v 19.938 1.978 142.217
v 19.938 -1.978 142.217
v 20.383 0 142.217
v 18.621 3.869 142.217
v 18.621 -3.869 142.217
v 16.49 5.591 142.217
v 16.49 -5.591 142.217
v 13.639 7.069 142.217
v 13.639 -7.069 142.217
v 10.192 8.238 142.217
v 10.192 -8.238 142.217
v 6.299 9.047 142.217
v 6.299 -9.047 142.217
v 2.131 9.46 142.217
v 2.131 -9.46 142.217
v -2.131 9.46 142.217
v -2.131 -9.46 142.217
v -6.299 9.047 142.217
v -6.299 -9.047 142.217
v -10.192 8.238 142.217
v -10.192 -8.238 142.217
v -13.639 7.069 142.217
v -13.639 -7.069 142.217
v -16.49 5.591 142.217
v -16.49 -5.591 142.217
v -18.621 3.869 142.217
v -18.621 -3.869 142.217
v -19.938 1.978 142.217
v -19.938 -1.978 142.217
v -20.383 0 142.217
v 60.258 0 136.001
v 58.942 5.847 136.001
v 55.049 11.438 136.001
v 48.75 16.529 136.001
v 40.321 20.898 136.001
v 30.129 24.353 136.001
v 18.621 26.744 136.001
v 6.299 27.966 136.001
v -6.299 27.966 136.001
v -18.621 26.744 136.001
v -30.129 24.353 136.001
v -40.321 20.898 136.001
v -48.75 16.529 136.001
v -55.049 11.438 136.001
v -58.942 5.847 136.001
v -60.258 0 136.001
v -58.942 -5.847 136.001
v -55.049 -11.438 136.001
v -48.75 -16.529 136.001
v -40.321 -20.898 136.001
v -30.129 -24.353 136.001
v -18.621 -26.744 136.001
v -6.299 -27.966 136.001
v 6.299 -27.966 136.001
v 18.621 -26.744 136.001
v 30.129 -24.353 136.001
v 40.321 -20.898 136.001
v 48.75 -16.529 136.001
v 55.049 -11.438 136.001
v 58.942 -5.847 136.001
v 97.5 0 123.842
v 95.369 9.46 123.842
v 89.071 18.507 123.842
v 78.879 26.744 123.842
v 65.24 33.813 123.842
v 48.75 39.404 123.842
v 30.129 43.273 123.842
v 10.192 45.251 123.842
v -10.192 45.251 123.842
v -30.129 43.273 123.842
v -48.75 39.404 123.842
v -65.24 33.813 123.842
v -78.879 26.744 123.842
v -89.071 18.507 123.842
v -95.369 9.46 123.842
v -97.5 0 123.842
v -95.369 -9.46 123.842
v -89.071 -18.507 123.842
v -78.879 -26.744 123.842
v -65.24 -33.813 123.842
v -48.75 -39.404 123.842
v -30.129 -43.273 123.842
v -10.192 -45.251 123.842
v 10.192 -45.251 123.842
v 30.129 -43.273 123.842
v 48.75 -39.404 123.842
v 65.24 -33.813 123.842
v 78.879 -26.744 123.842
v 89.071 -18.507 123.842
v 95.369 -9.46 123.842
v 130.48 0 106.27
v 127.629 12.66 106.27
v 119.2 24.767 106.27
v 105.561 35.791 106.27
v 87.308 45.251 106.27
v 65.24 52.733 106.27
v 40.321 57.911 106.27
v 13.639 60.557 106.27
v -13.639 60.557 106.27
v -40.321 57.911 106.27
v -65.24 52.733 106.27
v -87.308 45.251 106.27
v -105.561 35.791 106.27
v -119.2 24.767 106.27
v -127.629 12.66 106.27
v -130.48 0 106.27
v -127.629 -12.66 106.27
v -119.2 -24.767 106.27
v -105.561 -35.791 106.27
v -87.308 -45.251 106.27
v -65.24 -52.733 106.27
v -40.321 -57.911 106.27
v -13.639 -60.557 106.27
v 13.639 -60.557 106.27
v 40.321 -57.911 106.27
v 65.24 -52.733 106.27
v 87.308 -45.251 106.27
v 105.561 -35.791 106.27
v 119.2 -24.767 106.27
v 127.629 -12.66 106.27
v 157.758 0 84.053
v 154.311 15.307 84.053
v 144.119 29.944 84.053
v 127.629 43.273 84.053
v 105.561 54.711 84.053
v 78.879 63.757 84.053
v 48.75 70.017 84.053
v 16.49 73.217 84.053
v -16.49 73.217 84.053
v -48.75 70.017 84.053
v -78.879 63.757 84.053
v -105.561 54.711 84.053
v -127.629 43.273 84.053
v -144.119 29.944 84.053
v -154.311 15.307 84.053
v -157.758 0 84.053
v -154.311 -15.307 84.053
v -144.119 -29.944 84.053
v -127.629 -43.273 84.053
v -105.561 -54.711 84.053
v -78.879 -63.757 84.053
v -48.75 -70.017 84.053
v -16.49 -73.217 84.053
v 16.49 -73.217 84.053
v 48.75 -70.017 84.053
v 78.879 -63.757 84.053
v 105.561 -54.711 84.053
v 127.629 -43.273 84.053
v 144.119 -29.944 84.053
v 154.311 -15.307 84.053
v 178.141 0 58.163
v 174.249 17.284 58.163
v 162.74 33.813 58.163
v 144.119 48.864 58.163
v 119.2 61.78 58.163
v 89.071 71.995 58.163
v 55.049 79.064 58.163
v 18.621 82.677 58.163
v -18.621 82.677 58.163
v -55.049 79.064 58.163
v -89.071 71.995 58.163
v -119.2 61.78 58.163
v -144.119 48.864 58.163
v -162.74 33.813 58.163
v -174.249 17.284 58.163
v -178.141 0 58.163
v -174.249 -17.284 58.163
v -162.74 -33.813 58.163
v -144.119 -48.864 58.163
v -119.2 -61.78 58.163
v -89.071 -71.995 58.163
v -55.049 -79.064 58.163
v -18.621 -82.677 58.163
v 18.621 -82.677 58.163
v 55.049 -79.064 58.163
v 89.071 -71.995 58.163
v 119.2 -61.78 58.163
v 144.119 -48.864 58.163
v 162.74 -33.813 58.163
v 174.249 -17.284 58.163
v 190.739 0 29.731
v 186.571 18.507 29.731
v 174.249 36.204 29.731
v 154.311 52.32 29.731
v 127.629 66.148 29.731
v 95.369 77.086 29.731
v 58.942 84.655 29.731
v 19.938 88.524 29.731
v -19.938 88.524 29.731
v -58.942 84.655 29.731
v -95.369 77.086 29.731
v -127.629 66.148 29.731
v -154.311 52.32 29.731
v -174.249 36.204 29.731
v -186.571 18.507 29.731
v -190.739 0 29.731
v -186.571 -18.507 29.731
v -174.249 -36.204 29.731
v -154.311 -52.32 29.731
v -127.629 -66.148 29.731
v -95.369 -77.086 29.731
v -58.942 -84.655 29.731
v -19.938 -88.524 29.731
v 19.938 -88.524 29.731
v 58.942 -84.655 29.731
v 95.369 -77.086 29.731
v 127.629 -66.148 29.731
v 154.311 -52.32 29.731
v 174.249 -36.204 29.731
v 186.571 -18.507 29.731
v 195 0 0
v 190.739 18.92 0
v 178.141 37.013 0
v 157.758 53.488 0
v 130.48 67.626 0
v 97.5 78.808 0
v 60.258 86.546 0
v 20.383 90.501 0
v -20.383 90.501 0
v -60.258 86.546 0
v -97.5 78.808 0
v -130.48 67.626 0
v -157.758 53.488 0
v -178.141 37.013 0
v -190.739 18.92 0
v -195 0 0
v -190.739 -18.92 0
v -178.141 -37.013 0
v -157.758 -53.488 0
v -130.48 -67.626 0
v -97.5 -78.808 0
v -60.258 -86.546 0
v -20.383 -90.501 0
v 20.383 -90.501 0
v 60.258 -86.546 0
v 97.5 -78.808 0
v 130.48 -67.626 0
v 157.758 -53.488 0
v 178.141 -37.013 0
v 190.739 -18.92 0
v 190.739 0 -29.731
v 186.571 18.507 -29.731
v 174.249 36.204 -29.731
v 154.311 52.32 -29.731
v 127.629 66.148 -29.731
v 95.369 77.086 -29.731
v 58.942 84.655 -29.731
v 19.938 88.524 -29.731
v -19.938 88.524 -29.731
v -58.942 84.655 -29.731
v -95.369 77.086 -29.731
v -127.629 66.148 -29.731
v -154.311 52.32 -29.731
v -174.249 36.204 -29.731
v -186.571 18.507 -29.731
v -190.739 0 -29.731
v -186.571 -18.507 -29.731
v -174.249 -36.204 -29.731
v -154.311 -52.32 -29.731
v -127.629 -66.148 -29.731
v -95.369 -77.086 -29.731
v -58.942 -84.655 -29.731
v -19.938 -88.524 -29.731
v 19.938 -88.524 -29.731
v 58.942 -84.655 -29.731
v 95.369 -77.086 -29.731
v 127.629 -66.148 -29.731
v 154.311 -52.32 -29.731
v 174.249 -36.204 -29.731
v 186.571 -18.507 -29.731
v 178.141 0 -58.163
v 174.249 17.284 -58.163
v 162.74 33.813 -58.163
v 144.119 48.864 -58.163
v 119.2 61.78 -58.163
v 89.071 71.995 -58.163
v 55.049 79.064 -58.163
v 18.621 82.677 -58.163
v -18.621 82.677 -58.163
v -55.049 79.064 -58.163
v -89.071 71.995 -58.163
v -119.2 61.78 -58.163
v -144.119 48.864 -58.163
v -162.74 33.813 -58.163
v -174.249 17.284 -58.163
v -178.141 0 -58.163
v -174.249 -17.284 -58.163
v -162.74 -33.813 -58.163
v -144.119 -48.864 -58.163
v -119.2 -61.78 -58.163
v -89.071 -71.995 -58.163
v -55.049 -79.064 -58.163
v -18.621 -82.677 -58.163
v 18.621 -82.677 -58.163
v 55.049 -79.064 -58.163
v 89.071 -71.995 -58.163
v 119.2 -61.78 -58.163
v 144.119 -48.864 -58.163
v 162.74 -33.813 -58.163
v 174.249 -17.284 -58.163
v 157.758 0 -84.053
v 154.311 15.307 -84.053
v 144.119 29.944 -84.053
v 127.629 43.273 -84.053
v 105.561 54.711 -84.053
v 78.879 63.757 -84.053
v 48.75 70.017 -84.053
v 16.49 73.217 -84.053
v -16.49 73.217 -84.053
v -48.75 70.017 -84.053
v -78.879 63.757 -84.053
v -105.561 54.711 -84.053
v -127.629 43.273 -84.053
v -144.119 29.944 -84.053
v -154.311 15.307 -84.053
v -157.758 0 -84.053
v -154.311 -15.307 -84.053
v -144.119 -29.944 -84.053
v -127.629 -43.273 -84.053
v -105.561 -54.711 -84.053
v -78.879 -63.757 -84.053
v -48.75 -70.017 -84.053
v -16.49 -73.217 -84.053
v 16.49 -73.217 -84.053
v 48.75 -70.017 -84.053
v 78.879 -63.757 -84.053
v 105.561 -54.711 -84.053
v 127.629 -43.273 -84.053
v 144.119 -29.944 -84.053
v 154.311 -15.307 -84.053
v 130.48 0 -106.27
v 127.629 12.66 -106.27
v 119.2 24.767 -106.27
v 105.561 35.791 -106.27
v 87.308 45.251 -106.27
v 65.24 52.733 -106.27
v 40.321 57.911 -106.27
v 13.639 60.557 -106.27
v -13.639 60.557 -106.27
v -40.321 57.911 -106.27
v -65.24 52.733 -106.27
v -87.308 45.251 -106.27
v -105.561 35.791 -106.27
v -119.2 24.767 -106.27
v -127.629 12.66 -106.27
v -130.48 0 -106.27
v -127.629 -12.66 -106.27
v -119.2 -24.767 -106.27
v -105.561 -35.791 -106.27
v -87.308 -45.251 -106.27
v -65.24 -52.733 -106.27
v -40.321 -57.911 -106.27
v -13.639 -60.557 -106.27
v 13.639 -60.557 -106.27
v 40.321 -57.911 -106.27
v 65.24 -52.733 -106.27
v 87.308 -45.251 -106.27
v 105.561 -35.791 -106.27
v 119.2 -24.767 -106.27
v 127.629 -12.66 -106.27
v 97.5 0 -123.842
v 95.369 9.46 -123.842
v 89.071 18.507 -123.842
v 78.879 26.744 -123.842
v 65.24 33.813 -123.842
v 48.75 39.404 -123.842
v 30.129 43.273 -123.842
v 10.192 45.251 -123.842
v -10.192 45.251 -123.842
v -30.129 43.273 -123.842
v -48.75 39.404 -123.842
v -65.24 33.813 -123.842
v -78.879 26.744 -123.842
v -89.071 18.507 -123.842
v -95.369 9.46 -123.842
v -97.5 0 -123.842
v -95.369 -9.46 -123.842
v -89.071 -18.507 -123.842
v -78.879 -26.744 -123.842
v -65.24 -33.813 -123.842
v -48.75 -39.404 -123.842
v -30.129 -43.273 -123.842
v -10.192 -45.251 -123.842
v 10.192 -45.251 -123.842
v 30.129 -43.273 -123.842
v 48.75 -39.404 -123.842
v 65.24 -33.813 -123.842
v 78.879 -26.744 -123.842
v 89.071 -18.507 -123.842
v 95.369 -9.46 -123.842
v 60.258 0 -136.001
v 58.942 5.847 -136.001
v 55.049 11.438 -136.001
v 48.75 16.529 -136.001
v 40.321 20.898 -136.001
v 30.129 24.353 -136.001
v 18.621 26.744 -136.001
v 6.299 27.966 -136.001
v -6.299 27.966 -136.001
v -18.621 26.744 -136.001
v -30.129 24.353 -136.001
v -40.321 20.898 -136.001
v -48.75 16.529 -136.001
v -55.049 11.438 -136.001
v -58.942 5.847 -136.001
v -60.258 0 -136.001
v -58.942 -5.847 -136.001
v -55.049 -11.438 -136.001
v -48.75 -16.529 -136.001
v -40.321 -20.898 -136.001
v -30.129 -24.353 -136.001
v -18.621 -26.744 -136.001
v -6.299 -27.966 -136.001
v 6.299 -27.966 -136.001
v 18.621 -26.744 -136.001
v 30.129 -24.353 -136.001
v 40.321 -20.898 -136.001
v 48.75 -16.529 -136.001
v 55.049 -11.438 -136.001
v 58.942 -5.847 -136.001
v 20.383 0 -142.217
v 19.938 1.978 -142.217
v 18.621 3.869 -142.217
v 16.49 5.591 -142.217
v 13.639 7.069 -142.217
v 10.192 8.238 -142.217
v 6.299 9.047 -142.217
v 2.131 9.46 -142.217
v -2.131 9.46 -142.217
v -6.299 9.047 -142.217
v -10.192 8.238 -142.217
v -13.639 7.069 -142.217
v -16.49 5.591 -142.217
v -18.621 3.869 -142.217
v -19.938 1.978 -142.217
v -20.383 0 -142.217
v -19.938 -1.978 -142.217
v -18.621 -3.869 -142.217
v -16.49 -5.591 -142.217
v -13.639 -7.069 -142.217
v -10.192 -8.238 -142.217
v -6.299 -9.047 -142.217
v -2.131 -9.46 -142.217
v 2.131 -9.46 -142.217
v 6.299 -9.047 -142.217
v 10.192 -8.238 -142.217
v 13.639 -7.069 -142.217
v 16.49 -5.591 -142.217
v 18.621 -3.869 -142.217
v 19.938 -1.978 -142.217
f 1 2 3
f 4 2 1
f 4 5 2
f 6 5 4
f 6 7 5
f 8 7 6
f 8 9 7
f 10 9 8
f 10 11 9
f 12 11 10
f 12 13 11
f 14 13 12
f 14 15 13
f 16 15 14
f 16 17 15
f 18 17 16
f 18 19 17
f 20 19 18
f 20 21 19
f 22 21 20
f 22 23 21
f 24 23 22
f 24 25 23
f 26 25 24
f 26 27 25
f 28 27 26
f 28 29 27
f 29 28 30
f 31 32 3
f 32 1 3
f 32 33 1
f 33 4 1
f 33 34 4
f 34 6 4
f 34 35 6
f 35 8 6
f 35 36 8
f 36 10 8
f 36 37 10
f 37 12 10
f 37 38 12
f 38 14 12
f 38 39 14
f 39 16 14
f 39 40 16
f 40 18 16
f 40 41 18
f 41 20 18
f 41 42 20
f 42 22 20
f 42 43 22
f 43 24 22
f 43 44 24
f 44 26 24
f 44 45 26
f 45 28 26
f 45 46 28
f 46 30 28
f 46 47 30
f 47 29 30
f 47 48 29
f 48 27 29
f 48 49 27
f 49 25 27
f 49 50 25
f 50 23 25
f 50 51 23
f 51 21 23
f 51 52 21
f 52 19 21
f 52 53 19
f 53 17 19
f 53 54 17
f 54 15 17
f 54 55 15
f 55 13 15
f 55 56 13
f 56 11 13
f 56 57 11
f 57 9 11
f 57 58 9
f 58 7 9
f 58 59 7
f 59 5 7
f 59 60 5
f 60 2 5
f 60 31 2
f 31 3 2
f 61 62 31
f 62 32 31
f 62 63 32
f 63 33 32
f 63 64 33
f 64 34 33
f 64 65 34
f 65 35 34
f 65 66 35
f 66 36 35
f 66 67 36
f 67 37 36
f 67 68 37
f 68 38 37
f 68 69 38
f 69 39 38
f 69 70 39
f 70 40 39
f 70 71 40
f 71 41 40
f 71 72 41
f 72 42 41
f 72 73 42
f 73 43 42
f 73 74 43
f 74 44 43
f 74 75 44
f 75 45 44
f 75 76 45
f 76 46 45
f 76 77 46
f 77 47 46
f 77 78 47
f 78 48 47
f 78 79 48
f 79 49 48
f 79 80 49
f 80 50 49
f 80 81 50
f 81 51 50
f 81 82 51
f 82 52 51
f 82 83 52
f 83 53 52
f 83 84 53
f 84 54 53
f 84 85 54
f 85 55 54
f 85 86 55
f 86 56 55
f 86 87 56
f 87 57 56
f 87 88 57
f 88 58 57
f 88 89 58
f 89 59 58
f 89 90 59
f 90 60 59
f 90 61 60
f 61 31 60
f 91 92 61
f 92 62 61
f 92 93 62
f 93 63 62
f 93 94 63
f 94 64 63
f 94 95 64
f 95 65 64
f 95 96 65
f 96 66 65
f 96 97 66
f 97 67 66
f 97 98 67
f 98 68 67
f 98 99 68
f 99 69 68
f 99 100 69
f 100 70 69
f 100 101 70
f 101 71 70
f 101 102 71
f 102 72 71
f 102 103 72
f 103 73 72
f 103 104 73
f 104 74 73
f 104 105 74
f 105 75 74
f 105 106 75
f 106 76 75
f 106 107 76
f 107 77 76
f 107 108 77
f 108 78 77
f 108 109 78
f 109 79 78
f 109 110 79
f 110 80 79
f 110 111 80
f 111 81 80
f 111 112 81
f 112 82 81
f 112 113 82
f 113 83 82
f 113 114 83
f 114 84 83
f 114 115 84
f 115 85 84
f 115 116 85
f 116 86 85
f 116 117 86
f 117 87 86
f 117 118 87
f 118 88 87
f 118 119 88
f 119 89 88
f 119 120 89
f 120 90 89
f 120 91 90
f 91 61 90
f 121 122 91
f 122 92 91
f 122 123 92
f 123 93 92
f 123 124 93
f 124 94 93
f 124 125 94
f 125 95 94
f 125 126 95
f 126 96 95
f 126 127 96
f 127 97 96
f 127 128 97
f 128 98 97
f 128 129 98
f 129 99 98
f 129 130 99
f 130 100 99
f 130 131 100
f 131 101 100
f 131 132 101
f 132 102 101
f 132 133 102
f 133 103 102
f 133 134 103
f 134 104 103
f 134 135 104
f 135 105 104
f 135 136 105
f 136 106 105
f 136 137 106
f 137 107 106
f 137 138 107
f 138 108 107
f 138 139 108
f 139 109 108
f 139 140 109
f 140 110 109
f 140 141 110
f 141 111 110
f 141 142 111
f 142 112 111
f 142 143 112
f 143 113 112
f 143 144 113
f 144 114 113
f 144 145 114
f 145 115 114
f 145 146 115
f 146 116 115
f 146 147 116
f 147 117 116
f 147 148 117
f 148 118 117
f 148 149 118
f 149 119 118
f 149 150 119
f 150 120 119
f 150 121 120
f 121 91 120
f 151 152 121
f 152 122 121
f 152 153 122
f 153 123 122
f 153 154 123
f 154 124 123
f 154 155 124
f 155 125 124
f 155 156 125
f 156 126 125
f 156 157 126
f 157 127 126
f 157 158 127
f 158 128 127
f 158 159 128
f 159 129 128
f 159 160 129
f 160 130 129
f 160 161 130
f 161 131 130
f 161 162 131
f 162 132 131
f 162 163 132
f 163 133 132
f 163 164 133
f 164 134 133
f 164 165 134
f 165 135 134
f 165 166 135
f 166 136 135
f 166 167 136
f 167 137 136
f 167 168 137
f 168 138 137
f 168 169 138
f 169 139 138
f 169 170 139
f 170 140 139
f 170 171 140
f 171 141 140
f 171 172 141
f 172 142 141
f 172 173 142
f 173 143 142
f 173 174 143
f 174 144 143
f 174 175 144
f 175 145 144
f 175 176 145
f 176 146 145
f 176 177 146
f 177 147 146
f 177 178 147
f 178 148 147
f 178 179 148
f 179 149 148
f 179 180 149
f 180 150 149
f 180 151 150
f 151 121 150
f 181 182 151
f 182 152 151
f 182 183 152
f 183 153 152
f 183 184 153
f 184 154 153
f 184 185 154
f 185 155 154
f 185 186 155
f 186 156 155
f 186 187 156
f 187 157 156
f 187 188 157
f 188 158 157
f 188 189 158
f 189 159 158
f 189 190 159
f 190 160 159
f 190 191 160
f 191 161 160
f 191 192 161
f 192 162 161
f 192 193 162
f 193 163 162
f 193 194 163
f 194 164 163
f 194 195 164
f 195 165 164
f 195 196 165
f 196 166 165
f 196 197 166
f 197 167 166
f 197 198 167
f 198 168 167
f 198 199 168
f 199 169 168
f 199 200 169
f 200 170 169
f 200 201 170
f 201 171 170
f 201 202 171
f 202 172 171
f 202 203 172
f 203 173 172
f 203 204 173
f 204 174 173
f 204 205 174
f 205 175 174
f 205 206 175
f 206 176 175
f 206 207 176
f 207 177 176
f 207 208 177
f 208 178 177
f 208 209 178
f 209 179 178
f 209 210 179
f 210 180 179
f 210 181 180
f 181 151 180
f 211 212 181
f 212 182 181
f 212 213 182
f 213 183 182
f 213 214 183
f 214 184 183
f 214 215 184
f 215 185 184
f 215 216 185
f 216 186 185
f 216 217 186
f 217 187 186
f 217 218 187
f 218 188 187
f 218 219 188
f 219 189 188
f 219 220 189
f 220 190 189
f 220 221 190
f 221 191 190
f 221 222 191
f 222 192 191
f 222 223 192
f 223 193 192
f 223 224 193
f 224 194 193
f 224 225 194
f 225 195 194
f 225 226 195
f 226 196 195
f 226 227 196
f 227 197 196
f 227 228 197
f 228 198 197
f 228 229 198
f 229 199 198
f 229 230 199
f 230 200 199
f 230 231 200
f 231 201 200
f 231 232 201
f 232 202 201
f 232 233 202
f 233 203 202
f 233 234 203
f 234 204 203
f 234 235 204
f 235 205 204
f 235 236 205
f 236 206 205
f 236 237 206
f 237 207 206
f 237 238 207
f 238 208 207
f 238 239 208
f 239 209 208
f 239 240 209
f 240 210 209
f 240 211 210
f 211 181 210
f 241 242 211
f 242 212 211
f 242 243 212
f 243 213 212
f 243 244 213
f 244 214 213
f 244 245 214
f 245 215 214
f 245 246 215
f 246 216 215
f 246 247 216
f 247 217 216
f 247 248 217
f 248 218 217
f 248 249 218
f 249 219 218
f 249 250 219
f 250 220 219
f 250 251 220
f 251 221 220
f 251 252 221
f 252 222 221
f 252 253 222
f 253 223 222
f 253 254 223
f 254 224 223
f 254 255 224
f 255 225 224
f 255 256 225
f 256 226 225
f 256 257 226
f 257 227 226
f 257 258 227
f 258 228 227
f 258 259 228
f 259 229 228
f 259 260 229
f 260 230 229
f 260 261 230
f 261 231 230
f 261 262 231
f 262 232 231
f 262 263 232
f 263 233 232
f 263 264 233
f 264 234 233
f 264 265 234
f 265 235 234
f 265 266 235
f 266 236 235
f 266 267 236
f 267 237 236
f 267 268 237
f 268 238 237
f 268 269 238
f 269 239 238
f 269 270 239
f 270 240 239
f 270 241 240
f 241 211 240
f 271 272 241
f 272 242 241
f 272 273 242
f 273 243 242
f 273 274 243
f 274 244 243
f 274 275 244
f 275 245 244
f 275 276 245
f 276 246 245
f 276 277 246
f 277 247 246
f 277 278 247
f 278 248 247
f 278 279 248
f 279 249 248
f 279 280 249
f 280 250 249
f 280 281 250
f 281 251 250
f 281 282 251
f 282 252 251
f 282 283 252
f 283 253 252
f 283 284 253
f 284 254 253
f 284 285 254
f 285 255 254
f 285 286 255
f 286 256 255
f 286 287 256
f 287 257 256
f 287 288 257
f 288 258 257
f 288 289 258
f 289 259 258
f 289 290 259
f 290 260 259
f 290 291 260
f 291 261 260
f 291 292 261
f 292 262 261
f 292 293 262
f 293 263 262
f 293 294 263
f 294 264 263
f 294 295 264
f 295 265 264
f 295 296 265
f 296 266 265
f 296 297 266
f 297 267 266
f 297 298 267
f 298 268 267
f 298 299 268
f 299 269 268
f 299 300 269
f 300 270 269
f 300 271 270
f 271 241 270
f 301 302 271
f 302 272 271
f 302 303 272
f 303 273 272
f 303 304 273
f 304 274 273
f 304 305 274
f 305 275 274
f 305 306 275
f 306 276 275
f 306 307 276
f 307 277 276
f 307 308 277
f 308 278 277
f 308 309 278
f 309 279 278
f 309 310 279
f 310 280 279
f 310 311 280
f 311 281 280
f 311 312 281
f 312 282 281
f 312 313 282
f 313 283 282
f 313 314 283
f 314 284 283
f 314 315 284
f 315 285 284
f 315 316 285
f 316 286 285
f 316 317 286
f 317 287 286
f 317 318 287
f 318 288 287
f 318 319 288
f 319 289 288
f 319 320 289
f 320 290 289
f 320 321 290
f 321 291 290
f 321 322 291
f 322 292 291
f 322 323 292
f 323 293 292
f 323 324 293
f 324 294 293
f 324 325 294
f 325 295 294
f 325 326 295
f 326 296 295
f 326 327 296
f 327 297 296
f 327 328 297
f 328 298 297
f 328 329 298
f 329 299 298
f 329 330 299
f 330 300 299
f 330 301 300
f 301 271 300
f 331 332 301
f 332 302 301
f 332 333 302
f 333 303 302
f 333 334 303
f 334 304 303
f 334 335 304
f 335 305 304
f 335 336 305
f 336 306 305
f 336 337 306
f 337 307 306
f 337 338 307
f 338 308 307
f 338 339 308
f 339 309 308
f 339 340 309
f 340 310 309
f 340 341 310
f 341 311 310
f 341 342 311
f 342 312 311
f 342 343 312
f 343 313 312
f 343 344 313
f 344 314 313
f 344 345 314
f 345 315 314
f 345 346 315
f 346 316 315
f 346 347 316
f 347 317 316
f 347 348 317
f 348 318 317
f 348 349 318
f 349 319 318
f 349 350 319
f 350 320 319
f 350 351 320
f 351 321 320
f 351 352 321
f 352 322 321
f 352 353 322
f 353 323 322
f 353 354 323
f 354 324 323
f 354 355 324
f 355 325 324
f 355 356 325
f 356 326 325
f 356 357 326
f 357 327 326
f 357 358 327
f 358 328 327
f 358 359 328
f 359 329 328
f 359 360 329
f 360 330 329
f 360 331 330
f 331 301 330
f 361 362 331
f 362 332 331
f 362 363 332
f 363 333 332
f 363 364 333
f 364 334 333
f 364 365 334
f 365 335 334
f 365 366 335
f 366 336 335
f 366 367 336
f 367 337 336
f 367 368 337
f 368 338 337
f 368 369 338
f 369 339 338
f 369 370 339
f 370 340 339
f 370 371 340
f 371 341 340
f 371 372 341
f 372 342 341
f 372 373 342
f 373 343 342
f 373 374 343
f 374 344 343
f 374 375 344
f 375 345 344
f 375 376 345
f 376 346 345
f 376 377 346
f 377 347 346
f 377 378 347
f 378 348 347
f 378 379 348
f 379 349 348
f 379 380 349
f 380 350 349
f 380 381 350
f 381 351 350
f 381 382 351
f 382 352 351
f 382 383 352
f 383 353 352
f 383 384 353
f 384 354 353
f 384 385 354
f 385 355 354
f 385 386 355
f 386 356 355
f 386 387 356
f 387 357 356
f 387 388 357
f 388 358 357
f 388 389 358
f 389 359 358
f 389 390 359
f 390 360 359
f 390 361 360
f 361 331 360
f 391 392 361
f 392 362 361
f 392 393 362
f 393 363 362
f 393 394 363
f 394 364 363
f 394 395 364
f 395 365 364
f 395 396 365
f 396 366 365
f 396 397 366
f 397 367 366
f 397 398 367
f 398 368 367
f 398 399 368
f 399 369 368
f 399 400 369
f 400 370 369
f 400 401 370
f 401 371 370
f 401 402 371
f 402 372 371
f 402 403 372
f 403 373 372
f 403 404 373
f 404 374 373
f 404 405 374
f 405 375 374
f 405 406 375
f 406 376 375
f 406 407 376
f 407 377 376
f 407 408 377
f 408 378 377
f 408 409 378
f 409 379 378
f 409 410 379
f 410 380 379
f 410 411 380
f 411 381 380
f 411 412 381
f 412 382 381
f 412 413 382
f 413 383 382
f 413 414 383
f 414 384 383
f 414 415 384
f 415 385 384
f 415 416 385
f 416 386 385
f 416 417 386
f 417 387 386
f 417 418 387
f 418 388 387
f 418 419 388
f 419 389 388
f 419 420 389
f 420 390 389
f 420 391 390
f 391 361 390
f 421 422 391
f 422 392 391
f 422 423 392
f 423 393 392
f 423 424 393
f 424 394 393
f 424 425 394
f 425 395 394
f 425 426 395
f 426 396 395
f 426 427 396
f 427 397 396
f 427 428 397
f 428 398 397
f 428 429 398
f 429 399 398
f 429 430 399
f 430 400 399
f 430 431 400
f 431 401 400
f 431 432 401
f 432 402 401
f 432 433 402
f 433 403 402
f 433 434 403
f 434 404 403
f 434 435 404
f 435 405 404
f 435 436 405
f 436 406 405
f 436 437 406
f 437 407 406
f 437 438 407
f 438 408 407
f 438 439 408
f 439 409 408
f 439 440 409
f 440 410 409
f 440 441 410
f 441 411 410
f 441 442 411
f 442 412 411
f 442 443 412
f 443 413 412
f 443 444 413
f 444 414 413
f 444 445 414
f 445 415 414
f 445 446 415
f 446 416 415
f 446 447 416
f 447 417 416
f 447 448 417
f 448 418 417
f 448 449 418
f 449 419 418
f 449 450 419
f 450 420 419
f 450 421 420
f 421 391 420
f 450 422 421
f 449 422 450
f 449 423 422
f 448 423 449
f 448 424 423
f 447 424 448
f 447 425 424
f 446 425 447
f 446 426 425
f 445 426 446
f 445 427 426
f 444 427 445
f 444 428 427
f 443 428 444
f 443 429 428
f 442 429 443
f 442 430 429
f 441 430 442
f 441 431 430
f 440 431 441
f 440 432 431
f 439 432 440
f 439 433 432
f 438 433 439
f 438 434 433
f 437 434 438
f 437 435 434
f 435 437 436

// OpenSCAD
// Generated by SolidPython 1.0.1 on 2020-07-29 00:46:51


scale(v = [15, 7, 11]) {
	sphere(r = 13);
}
/***********************************************
*********      SolidPython code:      **********
************************************************
 
# import packages: SolidPython
from solid import *
from solid.utils import *
from itertools import chain, combinations, permutations


class Resize:

    def __init__(self, scad_file):
        self.scad_file = scad_file
        #self.scad_file = import_scad(scad_file)
        # cone/cylinder param:
        self.r1 = 0
        self.r2 = 0
        self.h = 0
        # rectangular prism param:
        self.w = 0
        self.l = 0
        # ellipse param:
        self.r = 0

    # import OpenScad code (file name corresponds to shape)


    # classify shape + parameters
    def assign(self, param1, param2, param3):
        if self.scad_file == 'cone.scad':
            self.r1 = param1
            self.r2 = param2
            self.h = param3
        elif self.scad_file == 'cylinder.scad':
            self.r1 = param1
            self.r2 = param2
            self.h = param3
        elif self.scad_file == 'rectangularPrism.scad':
            self.h = param1
            self.l = param2
            self.w = param3
        else:
            self.r = param1
            self.h = param2

    # resize parameters
    def iterate(self):
        x = range(3, 20, 2)
        i = 1
        if self.scad_file == 'cone.scad':
            tempList = list(permutations(x, 2))
            for temp in tempList:
                param1 = temp[0]
                param2 = temp[1]
                filepath = 'produced_scad_files/' + 'cone' + str(param1) + '_' + str(param2) + '_' + '.scad'
                scad_render_to_file(cylinder(h=param1, r1=param2, r2=0), filepath)

        elif self.scad_file == 'cylinder.scad':
            tempList = list(permutations(x, 3))
            for temp in tempList:
                param1 = temp[0]
                param2 = temp[1]
                filepath = 'produced_scad_files/' + 'cylinder' + str(param1) + '_' + str(param2) + '_' + '.scad'
                scad_render_to_file(cylinder(h=param1, r1=param2, r2=param2), filepath)

        elif self.scad_file == 'rectangularPrism.scad':
            tempList = list(permutations(x, 3))
            for temp in tempList:
                param1 = temp[0]
                param2 = temp[1]
                param3 = temp[2]
                filepath = 'produced_scad_files/' + 'rectangularPrism' + str(param1) + '_' + str(param2) + '_' + str(
                    param3) + '.scad'
                scad_render_to_file(cube(size=(param1, param2, param3)), filepath)

        elif self.scad_file == 'ellipse.scad':
            tempList = list(permutations(x, 4))
            for temp in tempList:
                param1 = temp[0]
                param2 = temp[1]
                param3 = temp[2]
                param4 = temp[3]
                filepath = 'produced_scad_files/' + 'ellipse' + str(param1) + '_' + str(param2) + '_' + str(param3) + '_' + str(param4) + '.scad'
                scad_render_to_file(scale([param1, param2, param3])(sphere(r=param4)), filepath)

    def render_to_scadfile(self):
        scad_render_to_file(scad, 'example.scad') 
 
************************************************/
